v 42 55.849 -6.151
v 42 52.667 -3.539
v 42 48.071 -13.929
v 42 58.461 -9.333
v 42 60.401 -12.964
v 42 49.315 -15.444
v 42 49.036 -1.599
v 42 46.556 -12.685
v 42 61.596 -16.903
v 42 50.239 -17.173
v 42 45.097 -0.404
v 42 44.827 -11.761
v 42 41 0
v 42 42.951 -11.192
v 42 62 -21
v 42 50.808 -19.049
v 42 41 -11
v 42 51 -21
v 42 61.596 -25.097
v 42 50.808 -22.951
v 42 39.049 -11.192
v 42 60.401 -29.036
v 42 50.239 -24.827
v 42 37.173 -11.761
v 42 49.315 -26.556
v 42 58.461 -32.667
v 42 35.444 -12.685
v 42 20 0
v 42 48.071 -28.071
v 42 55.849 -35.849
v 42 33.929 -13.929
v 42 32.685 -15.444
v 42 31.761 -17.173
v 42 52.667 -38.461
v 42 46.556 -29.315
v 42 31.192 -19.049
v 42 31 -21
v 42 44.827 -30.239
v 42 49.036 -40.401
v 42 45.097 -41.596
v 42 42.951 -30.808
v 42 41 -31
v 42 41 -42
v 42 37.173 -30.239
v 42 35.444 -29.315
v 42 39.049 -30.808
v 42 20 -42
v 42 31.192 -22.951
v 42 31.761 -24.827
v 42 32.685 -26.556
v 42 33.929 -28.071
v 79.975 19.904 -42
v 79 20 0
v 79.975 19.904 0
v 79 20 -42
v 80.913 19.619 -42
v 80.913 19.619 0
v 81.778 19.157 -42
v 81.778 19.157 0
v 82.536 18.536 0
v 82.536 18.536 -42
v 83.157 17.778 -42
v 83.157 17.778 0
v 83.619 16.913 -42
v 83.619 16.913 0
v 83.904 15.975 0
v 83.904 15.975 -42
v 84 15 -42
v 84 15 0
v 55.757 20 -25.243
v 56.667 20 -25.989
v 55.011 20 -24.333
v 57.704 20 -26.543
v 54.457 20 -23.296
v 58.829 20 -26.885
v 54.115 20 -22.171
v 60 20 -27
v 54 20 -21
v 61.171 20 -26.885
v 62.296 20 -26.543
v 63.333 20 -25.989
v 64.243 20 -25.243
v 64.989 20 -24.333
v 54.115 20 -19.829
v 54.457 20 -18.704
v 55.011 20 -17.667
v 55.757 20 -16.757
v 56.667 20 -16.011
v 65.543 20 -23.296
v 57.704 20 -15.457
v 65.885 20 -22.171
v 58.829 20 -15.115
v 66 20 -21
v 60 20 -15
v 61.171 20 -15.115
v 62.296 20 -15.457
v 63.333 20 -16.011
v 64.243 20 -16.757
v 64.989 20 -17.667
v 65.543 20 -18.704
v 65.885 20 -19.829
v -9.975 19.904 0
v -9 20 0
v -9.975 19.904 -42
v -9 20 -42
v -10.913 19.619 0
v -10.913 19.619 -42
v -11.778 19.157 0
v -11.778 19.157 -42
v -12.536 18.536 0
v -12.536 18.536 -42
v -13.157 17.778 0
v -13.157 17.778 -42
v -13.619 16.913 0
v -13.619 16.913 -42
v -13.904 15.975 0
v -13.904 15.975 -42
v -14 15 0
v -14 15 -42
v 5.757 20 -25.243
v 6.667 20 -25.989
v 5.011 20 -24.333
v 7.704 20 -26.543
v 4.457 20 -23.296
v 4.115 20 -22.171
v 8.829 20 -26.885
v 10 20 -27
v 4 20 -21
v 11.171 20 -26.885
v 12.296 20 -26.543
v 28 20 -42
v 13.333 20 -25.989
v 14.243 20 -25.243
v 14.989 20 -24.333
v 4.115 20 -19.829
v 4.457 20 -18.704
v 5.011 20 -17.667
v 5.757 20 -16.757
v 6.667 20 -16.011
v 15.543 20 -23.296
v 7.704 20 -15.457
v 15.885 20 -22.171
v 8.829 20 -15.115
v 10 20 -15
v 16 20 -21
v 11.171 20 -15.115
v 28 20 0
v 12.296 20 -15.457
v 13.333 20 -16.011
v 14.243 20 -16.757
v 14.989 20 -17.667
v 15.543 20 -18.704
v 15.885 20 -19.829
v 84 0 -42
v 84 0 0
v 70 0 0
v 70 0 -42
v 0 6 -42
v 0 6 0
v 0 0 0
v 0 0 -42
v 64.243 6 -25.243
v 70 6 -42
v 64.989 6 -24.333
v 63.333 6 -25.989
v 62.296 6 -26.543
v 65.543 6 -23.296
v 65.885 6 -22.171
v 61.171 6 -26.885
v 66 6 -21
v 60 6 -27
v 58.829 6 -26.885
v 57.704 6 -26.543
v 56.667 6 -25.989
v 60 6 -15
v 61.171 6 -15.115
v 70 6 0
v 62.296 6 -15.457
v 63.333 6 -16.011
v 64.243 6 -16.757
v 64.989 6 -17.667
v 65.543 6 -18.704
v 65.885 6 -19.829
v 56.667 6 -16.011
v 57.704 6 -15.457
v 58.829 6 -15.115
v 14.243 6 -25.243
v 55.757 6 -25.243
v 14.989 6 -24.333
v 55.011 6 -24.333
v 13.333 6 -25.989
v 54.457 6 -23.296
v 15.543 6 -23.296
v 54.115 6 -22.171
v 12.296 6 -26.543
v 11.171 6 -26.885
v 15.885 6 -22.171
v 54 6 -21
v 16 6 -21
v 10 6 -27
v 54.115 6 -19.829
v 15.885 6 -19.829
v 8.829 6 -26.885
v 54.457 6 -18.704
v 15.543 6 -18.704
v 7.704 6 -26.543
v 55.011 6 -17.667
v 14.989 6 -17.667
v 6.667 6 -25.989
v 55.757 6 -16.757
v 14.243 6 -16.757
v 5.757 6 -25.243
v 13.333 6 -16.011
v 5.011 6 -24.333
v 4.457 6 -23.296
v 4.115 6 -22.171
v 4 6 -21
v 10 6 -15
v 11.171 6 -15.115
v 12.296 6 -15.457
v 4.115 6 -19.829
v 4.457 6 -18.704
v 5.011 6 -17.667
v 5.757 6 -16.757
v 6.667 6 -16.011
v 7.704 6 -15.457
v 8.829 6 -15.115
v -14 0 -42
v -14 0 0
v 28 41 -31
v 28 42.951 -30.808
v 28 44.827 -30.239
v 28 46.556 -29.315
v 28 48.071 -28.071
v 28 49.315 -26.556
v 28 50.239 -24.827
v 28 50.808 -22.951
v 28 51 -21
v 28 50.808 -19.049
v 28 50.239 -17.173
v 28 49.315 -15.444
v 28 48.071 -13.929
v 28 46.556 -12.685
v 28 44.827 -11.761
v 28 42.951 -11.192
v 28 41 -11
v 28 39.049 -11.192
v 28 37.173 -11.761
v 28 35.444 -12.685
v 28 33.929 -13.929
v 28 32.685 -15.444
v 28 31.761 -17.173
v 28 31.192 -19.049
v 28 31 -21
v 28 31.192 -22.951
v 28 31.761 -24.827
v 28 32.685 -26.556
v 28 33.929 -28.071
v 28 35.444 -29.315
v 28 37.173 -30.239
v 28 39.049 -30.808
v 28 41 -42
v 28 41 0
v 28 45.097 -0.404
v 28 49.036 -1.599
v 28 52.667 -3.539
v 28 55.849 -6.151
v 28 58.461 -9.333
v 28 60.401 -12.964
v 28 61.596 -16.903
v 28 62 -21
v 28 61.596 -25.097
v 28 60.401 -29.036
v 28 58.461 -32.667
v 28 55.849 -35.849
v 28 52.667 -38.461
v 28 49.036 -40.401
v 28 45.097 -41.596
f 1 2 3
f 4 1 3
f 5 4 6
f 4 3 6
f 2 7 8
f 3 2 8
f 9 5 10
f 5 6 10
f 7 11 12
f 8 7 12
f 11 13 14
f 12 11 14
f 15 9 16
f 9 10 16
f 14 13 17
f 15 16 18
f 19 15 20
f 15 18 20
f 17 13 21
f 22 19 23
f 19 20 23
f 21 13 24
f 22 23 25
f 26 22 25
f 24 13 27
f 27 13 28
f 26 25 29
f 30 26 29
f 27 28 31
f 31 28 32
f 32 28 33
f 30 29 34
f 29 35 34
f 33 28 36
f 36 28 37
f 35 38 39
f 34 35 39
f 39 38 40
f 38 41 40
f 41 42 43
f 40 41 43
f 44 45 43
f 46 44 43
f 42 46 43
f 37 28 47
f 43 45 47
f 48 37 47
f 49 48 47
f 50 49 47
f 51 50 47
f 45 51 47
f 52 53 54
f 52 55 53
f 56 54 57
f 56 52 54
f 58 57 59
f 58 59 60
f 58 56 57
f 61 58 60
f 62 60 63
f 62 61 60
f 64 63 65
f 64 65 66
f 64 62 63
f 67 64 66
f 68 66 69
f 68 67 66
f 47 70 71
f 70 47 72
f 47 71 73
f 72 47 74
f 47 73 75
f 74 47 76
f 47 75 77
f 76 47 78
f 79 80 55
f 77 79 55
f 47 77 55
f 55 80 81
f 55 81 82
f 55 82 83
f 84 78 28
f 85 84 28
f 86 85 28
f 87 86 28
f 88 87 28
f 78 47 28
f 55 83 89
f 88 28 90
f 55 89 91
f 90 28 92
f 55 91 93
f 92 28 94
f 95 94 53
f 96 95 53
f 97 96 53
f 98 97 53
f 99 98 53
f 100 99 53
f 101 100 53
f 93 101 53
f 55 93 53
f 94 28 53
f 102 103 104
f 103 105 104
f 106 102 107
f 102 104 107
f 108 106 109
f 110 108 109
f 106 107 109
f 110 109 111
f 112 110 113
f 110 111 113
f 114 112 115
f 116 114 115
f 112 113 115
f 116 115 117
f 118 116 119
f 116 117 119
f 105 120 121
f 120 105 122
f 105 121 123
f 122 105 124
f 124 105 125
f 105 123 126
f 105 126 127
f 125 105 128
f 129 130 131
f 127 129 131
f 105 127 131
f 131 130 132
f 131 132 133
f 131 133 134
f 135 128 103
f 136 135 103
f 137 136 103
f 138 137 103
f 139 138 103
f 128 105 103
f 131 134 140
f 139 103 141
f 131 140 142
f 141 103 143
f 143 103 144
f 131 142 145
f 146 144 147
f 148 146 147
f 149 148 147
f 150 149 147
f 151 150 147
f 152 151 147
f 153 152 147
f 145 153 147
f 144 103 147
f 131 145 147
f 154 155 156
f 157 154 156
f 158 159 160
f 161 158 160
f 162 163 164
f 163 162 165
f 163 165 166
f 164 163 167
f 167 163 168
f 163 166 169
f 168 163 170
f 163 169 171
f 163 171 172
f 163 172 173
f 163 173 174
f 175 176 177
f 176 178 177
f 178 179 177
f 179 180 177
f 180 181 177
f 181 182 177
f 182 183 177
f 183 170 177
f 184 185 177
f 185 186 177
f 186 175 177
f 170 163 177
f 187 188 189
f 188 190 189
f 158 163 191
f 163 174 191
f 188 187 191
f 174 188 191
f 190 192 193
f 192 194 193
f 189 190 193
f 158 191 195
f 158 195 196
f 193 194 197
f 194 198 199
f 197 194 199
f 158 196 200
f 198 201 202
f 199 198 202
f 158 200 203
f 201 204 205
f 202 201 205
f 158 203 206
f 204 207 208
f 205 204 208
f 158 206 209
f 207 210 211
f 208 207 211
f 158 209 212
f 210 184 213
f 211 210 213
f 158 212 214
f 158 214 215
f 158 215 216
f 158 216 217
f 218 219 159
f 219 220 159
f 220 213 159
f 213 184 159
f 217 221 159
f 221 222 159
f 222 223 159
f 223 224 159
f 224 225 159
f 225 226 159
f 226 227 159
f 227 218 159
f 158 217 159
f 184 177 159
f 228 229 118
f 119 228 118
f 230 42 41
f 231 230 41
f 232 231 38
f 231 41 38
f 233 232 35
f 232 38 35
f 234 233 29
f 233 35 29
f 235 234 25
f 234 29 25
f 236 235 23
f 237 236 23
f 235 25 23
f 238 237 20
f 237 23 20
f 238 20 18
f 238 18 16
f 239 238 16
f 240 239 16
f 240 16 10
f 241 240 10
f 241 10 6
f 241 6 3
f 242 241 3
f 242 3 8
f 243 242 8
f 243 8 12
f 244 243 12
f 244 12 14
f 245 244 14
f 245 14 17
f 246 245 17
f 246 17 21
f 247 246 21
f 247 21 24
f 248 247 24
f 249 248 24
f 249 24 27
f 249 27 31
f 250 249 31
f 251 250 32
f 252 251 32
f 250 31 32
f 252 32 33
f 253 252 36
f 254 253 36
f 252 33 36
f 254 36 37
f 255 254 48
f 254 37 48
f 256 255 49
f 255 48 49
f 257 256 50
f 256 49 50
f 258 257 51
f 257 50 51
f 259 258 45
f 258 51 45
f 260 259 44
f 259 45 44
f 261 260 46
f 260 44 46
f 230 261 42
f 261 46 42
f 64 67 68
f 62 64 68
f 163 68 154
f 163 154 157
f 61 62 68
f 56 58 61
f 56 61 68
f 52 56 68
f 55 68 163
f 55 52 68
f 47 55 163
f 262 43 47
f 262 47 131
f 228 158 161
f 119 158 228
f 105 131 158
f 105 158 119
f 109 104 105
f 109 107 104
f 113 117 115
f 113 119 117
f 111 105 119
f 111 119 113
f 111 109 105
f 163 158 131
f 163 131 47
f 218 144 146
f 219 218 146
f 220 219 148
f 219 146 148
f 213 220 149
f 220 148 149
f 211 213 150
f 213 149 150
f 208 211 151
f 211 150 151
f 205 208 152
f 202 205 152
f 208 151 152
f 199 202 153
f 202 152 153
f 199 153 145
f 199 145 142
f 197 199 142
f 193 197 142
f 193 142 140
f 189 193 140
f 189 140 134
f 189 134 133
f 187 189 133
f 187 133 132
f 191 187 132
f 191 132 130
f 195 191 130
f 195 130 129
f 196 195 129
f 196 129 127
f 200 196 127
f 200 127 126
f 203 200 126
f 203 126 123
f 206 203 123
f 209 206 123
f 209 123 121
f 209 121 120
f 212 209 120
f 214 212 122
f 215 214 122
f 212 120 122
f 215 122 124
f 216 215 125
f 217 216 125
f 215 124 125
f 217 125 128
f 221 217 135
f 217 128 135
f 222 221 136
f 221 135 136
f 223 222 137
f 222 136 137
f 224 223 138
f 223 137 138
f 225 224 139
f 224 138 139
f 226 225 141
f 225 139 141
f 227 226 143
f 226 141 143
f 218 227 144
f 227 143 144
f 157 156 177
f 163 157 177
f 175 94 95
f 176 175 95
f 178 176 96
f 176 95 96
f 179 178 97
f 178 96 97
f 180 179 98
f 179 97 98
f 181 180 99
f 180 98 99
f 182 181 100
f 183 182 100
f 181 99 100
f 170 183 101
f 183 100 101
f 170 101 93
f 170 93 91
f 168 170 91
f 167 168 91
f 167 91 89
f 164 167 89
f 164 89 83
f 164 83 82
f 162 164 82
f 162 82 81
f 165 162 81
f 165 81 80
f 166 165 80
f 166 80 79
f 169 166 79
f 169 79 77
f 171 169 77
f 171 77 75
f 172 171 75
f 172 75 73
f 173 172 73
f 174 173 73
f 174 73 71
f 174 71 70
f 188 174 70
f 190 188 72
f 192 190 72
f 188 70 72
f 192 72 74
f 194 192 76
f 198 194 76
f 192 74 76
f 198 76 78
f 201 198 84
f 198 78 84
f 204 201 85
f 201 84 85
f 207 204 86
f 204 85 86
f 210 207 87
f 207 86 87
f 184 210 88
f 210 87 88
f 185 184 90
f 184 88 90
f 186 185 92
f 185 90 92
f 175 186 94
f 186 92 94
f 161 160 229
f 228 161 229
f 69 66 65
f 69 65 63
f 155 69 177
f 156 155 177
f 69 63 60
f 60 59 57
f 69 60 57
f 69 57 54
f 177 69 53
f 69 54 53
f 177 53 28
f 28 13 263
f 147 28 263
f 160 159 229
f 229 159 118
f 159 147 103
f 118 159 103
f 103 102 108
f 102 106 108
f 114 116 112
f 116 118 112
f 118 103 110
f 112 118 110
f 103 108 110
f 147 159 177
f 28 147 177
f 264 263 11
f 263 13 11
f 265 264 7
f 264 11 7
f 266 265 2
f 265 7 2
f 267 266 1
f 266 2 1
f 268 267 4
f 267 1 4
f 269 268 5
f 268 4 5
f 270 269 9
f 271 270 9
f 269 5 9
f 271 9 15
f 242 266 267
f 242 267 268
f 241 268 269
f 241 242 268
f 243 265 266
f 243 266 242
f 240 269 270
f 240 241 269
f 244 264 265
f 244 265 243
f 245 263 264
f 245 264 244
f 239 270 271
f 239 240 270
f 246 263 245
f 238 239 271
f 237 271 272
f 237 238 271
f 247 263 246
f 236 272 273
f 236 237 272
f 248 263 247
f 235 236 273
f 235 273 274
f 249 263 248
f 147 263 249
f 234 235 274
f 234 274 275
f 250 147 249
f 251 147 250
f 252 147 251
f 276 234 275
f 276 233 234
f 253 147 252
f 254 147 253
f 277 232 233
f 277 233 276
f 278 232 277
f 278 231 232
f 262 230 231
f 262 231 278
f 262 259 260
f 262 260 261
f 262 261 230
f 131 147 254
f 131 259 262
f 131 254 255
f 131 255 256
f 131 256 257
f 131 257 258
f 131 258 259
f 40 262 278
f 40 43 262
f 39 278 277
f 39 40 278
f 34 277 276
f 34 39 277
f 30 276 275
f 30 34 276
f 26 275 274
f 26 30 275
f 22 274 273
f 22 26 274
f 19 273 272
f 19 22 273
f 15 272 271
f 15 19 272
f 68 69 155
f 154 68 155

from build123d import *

# Parameters (mm, degrees)
BOSS_EXTRUDE1_DEPTH = 42
SKETCH4_R           = 6
CUT_EXTRUDE1_DEPTH  = 42
SKETCH6_W           = 14
SKETCH6_H           = 42
BOSS_EXTRUDE2_DEPTH = 42
FILLET1_R           = 21
SKETCH7_R           = 10
CUT_EXTRUDE2_DEPTH  = 42
FILLET4_R           = 5


with BuildPart() as part:
    # Sketch1 → Boss-Extrude1 (new body)
    with BuildSketch(Plane.XY):
        Polygon((0, 0), (-14, 0), (-14, 20), (84, 20), (84, 0), (70, 0), (70, 6), (0, 6), align=None)
    extrude(amount=-BOSS_EXTRUDE1_DEPTH)

    # Sketch4 → Cut-Extrude1 (cut)
    with BuildSketch(Plane(origin=(0, 20, 0), x_dir=(1, 0, 0), z_dir=(0, 1, 0))):
        with Locations(Location((60, 21, 0), (0, 0, 270))):
            Circle(SKETCH4_R)
        with Locations(Location((10, 21, 0), (0, 0, 270))):
            Circle(SKETCH4_R)
    extrude(amount=-CUT_EXTRUDE1_DEPTH, mode=Mode.SUBTRACT)

    # Sketch6 → Boss-Extrude2 (add)
    with BuildSketch(Plane(origin=(0, 20, 0), x_dir=(1, 0, 0), z_dir=(0, 1, 0))):
        with Locations((35, 21)):
            Rectangle(SKETCH6_W, SKETCH6_H)
    extrude(amount=BOSS_EXTRUDE2_DEPTH)

    # Fillet1
    fillet1_edges = [part.edges().sort_by_distance(p)[0] for p in [
        (35, 62, -42),
        (35, 62, 0),
    ]]
    fillet(fillet1_edges, radius=FILLET1_R - 0.0001)  # a hair under: the kernel refuses the full size

    # Sketch7 → Cut-Extrude2 (cut)
    with BuildSketch(Plane(origin=(42, 0, 0), x_dir=(0, 0, -1), z_dir=(1, 0, 0))):
        with Locations((21, 41)):
            Circle(SKETCH7_R)
    extrude(amount=-CUT_EXTRUDE2_DEPTH, mode=Mode.SUBTRACT)

    # Fillet4
    fillet4_edges = [part.edges().sort_by_distance(p)[0] for p in [
        (-14, 20, -21),
        (84, 20, -21),
    ]]
    fillet(fillet4_edges, radius=FILLET4_R)


solid = part.part
